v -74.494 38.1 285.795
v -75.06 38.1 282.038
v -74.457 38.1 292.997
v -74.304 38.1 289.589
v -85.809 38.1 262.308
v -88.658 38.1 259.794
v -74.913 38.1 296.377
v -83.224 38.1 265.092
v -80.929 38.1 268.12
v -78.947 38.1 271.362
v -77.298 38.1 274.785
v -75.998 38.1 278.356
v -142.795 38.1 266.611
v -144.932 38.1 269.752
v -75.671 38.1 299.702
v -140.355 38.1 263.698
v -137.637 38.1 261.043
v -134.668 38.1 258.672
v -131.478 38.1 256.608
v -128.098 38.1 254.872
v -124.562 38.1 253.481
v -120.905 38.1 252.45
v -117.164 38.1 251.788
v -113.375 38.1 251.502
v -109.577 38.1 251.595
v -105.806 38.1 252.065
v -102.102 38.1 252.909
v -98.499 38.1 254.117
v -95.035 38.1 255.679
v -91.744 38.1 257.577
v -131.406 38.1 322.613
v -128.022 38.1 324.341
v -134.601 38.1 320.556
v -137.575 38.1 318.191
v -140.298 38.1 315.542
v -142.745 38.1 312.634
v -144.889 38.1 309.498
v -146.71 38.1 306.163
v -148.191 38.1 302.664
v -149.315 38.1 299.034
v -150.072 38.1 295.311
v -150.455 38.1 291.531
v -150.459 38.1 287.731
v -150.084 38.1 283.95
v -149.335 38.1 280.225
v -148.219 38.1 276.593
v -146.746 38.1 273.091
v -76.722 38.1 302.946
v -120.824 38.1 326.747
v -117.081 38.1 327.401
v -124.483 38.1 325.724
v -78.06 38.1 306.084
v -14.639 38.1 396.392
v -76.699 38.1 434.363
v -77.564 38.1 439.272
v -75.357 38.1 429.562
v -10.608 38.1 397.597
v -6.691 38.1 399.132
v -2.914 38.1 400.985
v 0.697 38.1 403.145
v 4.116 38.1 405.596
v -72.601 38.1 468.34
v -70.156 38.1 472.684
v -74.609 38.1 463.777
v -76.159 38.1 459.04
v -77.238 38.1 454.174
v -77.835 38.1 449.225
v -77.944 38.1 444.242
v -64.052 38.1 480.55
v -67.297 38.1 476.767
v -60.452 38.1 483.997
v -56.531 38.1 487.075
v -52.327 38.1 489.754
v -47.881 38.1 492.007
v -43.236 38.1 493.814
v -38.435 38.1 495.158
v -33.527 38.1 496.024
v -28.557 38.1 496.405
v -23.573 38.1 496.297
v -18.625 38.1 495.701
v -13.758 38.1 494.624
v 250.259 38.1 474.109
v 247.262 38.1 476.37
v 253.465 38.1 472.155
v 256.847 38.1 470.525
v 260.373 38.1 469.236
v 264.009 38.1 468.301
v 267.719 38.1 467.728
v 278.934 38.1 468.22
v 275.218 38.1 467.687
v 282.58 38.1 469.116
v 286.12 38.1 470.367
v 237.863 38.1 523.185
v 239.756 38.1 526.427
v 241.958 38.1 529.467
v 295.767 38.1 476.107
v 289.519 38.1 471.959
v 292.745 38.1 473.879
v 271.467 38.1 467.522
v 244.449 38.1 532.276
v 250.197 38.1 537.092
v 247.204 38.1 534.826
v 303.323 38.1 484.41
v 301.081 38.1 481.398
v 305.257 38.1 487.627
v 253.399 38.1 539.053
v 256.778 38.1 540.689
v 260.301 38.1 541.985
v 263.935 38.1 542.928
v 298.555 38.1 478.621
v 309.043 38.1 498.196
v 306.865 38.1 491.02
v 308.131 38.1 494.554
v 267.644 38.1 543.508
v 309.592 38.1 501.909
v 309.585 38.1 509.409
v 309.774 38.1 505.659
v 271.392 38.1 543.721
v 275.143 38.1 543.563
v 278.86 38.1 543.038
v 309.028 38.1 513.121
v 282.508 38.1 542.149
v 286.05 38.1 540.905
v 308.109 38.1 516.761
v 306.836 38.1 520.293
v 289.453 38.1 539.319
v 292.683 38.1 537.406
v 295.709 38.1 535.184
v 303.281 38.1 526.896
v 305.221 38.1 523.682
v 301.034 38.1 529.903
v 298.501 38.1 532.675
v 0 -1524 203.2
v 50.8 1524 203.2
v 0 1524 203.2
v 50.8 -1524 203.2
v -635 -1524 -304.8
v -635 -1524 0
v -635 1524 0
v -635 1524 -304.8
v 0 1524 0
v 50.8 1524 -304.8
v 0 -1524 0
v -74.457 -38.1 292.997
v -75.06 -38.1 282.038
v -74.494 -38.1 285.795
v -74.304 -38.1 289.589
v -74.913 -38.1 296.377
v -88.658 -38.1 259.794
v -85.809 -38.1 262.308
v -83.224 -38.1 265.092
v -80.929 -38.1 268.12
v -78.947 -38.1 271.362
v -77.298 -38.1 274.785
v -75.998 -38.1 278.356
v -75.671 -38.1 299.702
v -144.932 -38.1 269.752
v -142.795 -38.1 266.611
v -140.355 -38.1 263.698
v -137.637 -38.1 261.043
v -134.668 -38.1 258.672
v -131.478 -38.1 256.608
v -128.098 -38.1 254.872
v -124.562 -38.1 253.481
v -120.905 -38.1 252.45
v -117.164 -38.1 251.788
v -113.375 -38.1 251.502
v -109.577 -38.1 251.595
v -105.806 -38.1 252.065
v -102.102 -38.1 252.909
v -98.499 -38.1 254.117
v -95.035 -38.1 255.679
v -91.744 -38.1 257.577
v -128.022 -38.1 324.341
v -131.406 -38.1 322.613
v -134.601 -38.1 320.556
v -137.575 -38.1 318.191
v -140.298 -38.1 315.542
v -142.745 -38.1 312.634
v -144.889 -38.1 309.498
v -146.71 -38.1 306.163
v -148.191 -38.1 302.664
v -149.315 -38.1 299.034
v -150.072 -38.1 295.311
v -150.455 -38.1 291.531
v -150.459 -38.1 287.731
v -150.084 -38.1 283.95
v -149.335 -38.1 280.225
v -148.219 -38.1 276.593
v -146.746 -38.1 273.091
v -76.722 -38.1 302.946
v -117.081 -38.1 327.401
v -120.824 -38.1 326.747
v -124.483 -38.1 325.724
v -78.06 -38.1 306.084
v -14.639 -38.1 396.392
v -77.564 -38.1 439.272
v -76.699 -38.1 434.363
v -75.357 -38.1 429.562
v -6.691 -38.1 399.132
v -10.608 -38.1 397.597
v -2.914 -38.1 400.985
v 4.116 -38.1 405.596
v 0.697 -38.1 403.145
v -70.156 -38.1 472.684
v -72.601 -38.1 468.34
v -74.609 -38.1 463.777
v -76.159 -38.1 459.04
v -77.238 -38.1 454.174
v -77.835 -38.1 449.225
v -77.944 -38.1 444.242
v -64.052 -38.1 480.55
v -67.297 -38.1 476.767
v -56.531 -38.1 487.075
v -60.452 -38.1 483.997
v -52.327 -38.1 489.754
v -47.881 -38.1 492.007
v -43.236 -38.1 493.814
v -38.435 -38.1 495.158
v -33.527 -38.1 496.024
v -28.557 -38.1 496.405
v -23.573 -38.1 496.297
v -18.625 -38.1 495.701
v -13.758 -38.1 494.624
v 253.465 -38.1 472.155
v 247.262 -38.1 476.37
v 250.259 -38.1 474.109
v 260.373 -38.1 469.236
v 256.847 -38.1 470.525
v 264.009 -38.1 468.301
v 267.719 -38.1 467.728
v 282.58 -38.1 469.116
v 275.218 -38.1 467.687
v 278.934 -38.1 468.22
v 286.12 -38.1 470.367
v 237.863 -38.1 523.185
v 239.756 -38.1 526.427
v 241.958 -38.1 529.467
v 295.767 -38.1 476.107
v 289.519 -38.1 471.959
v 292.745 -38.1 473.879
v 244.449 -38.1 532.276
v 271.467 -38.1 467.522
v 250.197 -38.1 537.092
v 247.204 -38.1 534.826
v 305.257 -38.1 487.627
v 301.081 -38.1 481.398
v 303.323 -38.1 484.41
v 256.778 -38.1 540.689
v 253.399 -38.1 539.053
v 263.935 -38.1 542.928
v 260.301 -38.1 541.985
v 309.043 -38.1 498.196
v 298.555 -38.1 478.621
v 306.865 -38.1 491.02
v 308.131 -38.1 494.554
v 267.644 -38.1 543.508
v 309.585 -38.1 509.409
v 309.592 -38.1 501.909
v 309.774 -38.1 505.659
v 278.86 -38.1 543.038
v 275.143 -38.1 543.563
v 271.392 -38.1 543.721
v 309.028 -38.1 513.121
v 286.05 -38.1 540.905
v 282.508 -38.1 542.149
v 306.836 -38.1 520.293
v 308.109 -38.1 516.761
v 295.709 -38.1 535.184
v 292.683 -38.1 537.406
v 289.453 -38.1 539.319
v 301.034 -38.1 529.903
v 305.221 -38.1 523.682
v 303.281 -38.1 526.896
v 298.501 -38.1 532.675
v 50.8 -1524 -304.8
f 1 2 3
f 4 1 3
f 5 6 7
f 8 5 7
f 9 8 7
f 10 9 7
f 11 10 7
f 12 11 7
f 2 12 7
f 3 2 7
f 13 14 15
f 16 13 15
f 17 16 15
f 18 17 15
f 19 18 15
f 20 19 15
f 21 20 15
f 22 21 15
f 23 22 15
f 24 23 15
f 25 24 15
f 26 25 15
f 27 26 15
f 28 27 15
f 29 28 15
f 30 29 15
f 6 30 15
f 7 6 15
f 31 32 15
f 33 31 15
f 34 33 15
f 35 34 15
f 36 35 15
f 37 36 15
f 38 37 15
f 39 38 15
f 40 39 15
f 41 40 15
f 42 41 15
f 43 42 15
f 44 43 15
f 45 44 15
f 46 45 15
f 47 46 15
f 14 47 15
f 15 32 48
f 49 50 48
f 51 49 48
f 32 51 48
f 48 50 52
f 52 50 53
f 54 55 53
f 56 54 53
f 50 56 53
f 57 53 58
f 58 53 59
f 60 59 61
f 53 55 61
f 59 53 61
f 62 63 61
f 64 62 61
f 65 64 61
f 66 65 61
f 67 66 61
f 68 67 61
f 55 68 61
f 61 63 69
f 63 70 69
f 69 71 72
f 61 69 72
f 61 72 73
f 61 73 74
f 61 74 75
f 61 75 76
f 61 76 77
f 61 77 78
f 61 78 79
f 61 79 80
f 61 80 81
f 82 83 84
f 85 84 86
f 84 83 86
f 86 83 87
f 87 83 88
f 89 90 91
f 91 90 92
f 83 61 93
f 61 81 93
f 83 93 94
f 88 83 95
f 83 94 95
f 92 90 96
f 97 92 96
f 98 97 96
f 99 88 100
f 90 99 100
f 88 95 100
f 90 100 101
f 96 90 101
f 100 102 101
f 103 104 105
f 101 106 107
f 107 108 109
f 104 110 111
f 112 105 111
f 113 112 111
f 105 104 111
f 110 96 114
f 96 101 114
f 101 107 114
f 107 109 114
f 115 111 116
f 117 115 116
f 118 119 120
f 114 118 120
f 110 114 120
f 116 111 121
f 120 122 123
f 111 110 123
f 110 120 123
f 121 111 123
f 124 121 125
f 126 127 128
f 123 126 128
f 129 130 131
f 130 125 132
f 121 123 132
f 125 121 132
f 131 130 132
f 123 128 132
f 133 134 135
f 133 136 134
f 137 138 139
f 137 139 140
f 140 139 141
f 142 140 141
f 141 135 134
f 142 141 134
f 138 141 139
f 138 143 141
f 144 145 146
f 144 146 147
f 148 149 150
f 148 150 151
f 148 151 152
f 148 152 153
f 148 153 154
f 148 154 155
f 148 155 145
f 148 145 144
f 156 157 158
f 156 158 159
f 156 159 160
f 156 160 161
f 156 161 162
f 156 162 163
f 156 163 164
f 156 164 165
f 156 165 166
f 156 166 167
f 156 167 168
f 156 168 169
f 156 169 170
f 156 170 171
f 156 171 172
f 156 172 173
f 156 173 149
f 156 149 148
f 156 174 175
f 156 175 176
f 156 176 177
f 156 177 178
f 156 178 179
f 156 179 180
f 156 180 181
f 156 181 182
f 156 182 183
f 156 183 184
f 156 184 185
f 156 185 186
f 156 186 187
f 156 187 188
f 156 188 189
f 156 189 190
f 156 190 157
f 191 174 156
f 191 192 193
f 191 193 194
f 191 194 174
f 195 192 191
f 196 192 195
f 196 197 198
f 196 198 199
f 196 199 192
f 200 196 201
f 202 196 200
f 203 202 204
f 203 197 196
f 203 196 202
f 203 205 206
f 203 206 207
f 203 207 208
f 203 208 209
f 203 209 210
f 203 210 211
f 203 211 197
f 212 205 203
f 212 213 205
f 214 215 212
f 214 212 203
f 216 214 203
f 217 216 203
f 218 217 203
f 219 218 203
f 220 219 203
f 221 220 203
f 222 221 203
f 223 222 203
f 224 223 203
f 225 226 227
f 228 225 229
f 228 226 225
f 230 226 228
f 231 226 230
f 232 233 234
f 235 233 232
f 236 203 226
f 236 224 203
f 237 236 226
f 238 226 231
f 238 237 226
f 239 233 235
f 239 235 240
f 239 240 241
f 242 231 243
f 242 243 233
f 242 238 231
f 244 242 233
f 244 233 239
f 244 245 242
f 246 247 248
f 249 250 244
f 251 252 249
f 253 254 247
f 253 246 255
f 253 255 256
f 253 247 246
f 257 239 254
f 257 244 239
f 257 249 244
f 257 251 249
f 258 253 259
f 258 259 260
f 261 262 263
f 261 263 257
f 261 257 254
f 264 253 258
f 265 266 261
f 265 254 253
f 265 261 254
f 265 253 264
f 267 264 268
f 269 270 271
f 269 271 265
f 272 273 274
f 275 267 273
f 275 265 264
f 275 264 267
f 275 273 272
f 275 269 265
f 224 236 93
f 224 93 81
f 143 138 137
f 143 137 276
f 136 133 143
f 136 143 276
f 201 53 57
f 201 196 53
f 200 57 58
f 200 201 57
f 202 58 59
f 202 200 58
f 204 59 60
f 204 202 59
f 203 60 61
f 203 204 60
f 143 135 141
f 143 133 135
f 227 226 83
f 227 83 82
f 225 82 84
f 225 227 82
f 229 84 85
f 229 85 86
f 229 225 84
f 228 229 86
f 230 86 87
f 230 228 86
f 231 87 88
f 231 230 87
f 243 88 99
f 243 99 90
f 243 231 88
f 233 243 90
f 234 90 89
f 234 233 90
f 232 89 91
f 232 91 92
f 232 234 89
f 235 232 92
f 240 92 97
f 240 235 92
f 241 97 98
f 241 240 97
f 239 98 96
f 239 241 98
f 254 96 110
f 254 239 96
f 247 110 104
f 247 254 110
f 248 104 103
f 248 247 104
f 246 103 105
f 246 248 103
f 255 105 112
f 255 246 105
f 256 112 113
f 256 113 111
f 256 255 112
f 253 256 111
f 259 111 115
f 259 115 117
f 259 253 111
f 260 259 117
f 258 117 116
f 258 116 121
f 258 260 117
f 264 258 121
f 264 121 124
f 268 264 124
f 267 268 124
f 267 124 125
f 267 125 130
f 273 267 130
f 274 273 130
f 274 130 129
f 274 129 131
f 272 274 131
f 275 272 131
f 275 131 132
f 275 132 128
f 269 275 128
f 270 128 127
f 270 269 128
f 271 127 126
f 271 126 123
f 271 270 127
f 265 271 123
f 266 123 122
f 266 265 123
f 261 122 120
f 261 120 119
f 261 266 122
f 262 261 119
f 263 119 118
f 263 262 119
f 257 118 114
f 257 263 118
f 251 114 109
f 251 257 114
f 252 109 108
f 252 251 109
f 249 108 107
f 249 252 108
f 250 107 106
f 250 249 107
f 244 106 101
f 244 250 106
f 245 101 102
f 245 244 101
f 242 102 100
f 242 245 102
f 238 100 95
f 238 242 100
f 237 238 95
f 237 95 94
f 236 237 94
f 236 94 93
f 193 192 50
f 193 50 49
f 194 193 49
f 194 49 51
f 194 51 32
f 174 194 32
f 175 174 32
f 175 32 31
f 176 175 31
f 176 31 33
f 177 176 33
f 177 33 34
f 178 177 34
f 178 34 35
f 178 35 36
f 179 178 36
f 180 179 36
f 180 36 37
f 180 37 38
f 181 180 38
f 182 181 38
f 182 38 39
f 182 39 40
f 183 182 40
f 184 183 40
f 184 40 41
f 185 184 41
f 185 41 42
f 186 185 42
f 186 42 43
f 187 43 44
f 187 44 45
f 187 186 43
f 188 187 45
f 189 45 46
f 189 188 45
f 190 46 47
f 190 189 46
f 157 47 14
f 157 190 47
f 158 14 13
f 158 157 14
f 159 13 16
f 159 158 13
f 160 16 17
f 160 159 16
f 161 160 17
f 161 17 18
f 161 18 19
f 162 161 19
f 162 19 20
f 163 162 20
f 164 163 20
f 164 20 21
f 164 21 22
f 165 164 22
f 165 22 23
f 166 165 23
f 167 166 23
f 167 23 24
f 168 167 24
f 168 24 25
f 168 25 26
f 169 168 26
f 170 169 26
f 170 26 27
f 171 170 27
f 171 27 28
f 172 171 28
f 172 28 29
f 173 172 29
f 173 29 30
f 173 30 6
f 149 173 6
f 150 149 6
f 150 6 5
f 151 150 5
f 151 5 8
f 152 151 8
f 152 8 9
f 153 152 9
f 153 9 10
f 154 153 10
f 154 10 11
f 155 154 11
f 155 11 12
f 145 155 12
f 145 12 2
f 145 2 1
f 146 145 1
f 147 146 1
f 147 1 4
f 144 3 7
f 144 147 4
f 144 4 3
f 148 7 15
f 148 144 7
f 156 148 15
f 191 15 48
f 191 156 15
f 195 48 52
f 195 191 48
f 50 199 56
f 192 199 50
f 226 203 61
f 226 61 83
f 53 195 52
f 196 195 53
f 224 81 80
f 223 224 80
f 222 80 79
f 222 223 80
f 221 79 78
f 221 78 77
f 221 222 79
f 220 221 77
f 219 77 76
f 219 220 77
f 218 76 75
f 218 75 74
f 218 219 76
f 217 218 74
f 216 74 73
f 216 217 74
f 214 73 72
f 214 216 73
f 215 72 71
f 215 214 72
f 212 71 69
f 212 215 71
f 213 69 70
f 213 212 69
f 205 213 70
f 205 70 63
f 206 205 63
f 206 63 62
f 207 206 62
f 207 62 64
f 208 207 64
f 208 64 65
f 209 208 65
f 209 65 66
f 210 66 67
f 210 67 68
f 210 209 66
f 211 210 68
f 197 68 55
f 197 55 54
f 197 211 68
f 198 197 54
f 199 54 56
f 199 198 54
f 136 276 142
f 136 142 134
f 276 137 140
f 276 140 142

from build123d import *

# Parameters (mm, degrees)
F1_DEPTH = 1524
F3_DEPTH = 38.1


# Not quite as in the source:
# - the program builds the solid bodies; features that only make, move or delete a surface that nothing else refers to are left out


with BuildPart() as f1:
    # F0 (on Front) → F1 (new body, symmetric)
    with BuildSketch(Plane.XZ):
        Polygon((0, 0), (-635, 0), (-635, -304.8), (50.8, -304.8), (50.8, 203.2), (0, 203.2), align=None)
    extrude(amount=F1_DEPTH, both=True)


with BuildPart() as f3:
    # F2 (on Front) → F3 (new body, symmetric)
    with BuildSketch(Plane.XZ):
        with BuildLine():
            ThreePointArc((-75.3569098829, 429.5622010227), (-51.5175746271, 401.0427737637), (-14.6388120751, 396.3921276521))
            ThreePointArc((-14.6388120751, 396.3921276521), (-4.7830646148, 400.019479985), (4.1161927035, 405.5959181074))
            ThreePointArc((4.1161927035, 405.5959181074), (18.4967583285, 423.3568590758), (23.6370308853, 445.6240836405))
            ThreePointArc((23.6370308853, 445.6240836405), (13.220292501, 476.443431156), (-13.7579368817, 494.6235235438))
            ThreePointArc((-13.7579368817, 494.6235235438), (-64.0521404433, 480.5501346438), (-75.3569098829, 429.5622010227))
        make_face()
        with BuildLine():
            ThreePointArc((23.6370308853, 445.6240836405), (18.4967583285, 423.3568590758), (4.1161927035, 405.5959181074))
            Line((4.1161927035, 405.5959181074), (247.2621074291, 476.3695837783))
            ThreePointArc((247.2621074291, 476.3695837783), (234.3190735269, 498.1220014658), (237.8630415532, 523.1845251311))
            Line((237.8630415532, 523.1845251311), (-13.7579368817, 494.6235235438))
            ThreePointArc((-13.7579368817, 494.6235235438), (13.220292501, 476.443431156), (23.6370308853, 445.6240836405))
        make_face()
        with BuildLine():
            ThreePointArc((237.8630415532, 523.1845251311), (234.3190735269, 498.1220014658), (247.2621074291, 476.3695837783))
            ThreePointArc((247.2621074291, 476.3695837783), (287.8218736761, 471.1130832643), (309.7736510471, 505.6217040122))
            ThreePointArc((309.7736510471, 505.6217040122), (280.713169239, 542.6338251465), (237.8630415532, 523.1845251311))
        make_face()
        with BuildLine():
            ThreePointArc((-117.0813960528, 327.4013066613), (-137.6370487848, 261.0429106479), (-74.3040884081, 289.5894990716))
            ThreePointArc((-74.3040884081, 289.5894990716), (-75.2548147797, 298.0477180849), (-78.059546092, 306.0838136404))
            ThreePointArc((-78.059546092, 306.0838136404), (-94.1381342738, 323.0254814792), (-117.0813960528, 327.4013066613))
        make_face()
        with BuildLine():
            ThreePointArc((-117.0813960528, 327.4013066613), (-94.1381342738, 323.0254814792), (-78.059546092, 306.0838136404))
            Line((-78.059546092, 306.0838136404), (-14.6388120751, 396.3921276521))
            ThreePointArc((-14.6388120751, 396.3921276521), (-51.5175746271, 401.0427737637), (-75.3569098829, 429.5622010227))
            Line((-75.3569098829, 429.5622010227), (-117.0813960528, 327.4013066613))
        make_face()
    extrude(amount=F3_DEPTH, both=True)


solid = Compound([f1.part, f3.part])
